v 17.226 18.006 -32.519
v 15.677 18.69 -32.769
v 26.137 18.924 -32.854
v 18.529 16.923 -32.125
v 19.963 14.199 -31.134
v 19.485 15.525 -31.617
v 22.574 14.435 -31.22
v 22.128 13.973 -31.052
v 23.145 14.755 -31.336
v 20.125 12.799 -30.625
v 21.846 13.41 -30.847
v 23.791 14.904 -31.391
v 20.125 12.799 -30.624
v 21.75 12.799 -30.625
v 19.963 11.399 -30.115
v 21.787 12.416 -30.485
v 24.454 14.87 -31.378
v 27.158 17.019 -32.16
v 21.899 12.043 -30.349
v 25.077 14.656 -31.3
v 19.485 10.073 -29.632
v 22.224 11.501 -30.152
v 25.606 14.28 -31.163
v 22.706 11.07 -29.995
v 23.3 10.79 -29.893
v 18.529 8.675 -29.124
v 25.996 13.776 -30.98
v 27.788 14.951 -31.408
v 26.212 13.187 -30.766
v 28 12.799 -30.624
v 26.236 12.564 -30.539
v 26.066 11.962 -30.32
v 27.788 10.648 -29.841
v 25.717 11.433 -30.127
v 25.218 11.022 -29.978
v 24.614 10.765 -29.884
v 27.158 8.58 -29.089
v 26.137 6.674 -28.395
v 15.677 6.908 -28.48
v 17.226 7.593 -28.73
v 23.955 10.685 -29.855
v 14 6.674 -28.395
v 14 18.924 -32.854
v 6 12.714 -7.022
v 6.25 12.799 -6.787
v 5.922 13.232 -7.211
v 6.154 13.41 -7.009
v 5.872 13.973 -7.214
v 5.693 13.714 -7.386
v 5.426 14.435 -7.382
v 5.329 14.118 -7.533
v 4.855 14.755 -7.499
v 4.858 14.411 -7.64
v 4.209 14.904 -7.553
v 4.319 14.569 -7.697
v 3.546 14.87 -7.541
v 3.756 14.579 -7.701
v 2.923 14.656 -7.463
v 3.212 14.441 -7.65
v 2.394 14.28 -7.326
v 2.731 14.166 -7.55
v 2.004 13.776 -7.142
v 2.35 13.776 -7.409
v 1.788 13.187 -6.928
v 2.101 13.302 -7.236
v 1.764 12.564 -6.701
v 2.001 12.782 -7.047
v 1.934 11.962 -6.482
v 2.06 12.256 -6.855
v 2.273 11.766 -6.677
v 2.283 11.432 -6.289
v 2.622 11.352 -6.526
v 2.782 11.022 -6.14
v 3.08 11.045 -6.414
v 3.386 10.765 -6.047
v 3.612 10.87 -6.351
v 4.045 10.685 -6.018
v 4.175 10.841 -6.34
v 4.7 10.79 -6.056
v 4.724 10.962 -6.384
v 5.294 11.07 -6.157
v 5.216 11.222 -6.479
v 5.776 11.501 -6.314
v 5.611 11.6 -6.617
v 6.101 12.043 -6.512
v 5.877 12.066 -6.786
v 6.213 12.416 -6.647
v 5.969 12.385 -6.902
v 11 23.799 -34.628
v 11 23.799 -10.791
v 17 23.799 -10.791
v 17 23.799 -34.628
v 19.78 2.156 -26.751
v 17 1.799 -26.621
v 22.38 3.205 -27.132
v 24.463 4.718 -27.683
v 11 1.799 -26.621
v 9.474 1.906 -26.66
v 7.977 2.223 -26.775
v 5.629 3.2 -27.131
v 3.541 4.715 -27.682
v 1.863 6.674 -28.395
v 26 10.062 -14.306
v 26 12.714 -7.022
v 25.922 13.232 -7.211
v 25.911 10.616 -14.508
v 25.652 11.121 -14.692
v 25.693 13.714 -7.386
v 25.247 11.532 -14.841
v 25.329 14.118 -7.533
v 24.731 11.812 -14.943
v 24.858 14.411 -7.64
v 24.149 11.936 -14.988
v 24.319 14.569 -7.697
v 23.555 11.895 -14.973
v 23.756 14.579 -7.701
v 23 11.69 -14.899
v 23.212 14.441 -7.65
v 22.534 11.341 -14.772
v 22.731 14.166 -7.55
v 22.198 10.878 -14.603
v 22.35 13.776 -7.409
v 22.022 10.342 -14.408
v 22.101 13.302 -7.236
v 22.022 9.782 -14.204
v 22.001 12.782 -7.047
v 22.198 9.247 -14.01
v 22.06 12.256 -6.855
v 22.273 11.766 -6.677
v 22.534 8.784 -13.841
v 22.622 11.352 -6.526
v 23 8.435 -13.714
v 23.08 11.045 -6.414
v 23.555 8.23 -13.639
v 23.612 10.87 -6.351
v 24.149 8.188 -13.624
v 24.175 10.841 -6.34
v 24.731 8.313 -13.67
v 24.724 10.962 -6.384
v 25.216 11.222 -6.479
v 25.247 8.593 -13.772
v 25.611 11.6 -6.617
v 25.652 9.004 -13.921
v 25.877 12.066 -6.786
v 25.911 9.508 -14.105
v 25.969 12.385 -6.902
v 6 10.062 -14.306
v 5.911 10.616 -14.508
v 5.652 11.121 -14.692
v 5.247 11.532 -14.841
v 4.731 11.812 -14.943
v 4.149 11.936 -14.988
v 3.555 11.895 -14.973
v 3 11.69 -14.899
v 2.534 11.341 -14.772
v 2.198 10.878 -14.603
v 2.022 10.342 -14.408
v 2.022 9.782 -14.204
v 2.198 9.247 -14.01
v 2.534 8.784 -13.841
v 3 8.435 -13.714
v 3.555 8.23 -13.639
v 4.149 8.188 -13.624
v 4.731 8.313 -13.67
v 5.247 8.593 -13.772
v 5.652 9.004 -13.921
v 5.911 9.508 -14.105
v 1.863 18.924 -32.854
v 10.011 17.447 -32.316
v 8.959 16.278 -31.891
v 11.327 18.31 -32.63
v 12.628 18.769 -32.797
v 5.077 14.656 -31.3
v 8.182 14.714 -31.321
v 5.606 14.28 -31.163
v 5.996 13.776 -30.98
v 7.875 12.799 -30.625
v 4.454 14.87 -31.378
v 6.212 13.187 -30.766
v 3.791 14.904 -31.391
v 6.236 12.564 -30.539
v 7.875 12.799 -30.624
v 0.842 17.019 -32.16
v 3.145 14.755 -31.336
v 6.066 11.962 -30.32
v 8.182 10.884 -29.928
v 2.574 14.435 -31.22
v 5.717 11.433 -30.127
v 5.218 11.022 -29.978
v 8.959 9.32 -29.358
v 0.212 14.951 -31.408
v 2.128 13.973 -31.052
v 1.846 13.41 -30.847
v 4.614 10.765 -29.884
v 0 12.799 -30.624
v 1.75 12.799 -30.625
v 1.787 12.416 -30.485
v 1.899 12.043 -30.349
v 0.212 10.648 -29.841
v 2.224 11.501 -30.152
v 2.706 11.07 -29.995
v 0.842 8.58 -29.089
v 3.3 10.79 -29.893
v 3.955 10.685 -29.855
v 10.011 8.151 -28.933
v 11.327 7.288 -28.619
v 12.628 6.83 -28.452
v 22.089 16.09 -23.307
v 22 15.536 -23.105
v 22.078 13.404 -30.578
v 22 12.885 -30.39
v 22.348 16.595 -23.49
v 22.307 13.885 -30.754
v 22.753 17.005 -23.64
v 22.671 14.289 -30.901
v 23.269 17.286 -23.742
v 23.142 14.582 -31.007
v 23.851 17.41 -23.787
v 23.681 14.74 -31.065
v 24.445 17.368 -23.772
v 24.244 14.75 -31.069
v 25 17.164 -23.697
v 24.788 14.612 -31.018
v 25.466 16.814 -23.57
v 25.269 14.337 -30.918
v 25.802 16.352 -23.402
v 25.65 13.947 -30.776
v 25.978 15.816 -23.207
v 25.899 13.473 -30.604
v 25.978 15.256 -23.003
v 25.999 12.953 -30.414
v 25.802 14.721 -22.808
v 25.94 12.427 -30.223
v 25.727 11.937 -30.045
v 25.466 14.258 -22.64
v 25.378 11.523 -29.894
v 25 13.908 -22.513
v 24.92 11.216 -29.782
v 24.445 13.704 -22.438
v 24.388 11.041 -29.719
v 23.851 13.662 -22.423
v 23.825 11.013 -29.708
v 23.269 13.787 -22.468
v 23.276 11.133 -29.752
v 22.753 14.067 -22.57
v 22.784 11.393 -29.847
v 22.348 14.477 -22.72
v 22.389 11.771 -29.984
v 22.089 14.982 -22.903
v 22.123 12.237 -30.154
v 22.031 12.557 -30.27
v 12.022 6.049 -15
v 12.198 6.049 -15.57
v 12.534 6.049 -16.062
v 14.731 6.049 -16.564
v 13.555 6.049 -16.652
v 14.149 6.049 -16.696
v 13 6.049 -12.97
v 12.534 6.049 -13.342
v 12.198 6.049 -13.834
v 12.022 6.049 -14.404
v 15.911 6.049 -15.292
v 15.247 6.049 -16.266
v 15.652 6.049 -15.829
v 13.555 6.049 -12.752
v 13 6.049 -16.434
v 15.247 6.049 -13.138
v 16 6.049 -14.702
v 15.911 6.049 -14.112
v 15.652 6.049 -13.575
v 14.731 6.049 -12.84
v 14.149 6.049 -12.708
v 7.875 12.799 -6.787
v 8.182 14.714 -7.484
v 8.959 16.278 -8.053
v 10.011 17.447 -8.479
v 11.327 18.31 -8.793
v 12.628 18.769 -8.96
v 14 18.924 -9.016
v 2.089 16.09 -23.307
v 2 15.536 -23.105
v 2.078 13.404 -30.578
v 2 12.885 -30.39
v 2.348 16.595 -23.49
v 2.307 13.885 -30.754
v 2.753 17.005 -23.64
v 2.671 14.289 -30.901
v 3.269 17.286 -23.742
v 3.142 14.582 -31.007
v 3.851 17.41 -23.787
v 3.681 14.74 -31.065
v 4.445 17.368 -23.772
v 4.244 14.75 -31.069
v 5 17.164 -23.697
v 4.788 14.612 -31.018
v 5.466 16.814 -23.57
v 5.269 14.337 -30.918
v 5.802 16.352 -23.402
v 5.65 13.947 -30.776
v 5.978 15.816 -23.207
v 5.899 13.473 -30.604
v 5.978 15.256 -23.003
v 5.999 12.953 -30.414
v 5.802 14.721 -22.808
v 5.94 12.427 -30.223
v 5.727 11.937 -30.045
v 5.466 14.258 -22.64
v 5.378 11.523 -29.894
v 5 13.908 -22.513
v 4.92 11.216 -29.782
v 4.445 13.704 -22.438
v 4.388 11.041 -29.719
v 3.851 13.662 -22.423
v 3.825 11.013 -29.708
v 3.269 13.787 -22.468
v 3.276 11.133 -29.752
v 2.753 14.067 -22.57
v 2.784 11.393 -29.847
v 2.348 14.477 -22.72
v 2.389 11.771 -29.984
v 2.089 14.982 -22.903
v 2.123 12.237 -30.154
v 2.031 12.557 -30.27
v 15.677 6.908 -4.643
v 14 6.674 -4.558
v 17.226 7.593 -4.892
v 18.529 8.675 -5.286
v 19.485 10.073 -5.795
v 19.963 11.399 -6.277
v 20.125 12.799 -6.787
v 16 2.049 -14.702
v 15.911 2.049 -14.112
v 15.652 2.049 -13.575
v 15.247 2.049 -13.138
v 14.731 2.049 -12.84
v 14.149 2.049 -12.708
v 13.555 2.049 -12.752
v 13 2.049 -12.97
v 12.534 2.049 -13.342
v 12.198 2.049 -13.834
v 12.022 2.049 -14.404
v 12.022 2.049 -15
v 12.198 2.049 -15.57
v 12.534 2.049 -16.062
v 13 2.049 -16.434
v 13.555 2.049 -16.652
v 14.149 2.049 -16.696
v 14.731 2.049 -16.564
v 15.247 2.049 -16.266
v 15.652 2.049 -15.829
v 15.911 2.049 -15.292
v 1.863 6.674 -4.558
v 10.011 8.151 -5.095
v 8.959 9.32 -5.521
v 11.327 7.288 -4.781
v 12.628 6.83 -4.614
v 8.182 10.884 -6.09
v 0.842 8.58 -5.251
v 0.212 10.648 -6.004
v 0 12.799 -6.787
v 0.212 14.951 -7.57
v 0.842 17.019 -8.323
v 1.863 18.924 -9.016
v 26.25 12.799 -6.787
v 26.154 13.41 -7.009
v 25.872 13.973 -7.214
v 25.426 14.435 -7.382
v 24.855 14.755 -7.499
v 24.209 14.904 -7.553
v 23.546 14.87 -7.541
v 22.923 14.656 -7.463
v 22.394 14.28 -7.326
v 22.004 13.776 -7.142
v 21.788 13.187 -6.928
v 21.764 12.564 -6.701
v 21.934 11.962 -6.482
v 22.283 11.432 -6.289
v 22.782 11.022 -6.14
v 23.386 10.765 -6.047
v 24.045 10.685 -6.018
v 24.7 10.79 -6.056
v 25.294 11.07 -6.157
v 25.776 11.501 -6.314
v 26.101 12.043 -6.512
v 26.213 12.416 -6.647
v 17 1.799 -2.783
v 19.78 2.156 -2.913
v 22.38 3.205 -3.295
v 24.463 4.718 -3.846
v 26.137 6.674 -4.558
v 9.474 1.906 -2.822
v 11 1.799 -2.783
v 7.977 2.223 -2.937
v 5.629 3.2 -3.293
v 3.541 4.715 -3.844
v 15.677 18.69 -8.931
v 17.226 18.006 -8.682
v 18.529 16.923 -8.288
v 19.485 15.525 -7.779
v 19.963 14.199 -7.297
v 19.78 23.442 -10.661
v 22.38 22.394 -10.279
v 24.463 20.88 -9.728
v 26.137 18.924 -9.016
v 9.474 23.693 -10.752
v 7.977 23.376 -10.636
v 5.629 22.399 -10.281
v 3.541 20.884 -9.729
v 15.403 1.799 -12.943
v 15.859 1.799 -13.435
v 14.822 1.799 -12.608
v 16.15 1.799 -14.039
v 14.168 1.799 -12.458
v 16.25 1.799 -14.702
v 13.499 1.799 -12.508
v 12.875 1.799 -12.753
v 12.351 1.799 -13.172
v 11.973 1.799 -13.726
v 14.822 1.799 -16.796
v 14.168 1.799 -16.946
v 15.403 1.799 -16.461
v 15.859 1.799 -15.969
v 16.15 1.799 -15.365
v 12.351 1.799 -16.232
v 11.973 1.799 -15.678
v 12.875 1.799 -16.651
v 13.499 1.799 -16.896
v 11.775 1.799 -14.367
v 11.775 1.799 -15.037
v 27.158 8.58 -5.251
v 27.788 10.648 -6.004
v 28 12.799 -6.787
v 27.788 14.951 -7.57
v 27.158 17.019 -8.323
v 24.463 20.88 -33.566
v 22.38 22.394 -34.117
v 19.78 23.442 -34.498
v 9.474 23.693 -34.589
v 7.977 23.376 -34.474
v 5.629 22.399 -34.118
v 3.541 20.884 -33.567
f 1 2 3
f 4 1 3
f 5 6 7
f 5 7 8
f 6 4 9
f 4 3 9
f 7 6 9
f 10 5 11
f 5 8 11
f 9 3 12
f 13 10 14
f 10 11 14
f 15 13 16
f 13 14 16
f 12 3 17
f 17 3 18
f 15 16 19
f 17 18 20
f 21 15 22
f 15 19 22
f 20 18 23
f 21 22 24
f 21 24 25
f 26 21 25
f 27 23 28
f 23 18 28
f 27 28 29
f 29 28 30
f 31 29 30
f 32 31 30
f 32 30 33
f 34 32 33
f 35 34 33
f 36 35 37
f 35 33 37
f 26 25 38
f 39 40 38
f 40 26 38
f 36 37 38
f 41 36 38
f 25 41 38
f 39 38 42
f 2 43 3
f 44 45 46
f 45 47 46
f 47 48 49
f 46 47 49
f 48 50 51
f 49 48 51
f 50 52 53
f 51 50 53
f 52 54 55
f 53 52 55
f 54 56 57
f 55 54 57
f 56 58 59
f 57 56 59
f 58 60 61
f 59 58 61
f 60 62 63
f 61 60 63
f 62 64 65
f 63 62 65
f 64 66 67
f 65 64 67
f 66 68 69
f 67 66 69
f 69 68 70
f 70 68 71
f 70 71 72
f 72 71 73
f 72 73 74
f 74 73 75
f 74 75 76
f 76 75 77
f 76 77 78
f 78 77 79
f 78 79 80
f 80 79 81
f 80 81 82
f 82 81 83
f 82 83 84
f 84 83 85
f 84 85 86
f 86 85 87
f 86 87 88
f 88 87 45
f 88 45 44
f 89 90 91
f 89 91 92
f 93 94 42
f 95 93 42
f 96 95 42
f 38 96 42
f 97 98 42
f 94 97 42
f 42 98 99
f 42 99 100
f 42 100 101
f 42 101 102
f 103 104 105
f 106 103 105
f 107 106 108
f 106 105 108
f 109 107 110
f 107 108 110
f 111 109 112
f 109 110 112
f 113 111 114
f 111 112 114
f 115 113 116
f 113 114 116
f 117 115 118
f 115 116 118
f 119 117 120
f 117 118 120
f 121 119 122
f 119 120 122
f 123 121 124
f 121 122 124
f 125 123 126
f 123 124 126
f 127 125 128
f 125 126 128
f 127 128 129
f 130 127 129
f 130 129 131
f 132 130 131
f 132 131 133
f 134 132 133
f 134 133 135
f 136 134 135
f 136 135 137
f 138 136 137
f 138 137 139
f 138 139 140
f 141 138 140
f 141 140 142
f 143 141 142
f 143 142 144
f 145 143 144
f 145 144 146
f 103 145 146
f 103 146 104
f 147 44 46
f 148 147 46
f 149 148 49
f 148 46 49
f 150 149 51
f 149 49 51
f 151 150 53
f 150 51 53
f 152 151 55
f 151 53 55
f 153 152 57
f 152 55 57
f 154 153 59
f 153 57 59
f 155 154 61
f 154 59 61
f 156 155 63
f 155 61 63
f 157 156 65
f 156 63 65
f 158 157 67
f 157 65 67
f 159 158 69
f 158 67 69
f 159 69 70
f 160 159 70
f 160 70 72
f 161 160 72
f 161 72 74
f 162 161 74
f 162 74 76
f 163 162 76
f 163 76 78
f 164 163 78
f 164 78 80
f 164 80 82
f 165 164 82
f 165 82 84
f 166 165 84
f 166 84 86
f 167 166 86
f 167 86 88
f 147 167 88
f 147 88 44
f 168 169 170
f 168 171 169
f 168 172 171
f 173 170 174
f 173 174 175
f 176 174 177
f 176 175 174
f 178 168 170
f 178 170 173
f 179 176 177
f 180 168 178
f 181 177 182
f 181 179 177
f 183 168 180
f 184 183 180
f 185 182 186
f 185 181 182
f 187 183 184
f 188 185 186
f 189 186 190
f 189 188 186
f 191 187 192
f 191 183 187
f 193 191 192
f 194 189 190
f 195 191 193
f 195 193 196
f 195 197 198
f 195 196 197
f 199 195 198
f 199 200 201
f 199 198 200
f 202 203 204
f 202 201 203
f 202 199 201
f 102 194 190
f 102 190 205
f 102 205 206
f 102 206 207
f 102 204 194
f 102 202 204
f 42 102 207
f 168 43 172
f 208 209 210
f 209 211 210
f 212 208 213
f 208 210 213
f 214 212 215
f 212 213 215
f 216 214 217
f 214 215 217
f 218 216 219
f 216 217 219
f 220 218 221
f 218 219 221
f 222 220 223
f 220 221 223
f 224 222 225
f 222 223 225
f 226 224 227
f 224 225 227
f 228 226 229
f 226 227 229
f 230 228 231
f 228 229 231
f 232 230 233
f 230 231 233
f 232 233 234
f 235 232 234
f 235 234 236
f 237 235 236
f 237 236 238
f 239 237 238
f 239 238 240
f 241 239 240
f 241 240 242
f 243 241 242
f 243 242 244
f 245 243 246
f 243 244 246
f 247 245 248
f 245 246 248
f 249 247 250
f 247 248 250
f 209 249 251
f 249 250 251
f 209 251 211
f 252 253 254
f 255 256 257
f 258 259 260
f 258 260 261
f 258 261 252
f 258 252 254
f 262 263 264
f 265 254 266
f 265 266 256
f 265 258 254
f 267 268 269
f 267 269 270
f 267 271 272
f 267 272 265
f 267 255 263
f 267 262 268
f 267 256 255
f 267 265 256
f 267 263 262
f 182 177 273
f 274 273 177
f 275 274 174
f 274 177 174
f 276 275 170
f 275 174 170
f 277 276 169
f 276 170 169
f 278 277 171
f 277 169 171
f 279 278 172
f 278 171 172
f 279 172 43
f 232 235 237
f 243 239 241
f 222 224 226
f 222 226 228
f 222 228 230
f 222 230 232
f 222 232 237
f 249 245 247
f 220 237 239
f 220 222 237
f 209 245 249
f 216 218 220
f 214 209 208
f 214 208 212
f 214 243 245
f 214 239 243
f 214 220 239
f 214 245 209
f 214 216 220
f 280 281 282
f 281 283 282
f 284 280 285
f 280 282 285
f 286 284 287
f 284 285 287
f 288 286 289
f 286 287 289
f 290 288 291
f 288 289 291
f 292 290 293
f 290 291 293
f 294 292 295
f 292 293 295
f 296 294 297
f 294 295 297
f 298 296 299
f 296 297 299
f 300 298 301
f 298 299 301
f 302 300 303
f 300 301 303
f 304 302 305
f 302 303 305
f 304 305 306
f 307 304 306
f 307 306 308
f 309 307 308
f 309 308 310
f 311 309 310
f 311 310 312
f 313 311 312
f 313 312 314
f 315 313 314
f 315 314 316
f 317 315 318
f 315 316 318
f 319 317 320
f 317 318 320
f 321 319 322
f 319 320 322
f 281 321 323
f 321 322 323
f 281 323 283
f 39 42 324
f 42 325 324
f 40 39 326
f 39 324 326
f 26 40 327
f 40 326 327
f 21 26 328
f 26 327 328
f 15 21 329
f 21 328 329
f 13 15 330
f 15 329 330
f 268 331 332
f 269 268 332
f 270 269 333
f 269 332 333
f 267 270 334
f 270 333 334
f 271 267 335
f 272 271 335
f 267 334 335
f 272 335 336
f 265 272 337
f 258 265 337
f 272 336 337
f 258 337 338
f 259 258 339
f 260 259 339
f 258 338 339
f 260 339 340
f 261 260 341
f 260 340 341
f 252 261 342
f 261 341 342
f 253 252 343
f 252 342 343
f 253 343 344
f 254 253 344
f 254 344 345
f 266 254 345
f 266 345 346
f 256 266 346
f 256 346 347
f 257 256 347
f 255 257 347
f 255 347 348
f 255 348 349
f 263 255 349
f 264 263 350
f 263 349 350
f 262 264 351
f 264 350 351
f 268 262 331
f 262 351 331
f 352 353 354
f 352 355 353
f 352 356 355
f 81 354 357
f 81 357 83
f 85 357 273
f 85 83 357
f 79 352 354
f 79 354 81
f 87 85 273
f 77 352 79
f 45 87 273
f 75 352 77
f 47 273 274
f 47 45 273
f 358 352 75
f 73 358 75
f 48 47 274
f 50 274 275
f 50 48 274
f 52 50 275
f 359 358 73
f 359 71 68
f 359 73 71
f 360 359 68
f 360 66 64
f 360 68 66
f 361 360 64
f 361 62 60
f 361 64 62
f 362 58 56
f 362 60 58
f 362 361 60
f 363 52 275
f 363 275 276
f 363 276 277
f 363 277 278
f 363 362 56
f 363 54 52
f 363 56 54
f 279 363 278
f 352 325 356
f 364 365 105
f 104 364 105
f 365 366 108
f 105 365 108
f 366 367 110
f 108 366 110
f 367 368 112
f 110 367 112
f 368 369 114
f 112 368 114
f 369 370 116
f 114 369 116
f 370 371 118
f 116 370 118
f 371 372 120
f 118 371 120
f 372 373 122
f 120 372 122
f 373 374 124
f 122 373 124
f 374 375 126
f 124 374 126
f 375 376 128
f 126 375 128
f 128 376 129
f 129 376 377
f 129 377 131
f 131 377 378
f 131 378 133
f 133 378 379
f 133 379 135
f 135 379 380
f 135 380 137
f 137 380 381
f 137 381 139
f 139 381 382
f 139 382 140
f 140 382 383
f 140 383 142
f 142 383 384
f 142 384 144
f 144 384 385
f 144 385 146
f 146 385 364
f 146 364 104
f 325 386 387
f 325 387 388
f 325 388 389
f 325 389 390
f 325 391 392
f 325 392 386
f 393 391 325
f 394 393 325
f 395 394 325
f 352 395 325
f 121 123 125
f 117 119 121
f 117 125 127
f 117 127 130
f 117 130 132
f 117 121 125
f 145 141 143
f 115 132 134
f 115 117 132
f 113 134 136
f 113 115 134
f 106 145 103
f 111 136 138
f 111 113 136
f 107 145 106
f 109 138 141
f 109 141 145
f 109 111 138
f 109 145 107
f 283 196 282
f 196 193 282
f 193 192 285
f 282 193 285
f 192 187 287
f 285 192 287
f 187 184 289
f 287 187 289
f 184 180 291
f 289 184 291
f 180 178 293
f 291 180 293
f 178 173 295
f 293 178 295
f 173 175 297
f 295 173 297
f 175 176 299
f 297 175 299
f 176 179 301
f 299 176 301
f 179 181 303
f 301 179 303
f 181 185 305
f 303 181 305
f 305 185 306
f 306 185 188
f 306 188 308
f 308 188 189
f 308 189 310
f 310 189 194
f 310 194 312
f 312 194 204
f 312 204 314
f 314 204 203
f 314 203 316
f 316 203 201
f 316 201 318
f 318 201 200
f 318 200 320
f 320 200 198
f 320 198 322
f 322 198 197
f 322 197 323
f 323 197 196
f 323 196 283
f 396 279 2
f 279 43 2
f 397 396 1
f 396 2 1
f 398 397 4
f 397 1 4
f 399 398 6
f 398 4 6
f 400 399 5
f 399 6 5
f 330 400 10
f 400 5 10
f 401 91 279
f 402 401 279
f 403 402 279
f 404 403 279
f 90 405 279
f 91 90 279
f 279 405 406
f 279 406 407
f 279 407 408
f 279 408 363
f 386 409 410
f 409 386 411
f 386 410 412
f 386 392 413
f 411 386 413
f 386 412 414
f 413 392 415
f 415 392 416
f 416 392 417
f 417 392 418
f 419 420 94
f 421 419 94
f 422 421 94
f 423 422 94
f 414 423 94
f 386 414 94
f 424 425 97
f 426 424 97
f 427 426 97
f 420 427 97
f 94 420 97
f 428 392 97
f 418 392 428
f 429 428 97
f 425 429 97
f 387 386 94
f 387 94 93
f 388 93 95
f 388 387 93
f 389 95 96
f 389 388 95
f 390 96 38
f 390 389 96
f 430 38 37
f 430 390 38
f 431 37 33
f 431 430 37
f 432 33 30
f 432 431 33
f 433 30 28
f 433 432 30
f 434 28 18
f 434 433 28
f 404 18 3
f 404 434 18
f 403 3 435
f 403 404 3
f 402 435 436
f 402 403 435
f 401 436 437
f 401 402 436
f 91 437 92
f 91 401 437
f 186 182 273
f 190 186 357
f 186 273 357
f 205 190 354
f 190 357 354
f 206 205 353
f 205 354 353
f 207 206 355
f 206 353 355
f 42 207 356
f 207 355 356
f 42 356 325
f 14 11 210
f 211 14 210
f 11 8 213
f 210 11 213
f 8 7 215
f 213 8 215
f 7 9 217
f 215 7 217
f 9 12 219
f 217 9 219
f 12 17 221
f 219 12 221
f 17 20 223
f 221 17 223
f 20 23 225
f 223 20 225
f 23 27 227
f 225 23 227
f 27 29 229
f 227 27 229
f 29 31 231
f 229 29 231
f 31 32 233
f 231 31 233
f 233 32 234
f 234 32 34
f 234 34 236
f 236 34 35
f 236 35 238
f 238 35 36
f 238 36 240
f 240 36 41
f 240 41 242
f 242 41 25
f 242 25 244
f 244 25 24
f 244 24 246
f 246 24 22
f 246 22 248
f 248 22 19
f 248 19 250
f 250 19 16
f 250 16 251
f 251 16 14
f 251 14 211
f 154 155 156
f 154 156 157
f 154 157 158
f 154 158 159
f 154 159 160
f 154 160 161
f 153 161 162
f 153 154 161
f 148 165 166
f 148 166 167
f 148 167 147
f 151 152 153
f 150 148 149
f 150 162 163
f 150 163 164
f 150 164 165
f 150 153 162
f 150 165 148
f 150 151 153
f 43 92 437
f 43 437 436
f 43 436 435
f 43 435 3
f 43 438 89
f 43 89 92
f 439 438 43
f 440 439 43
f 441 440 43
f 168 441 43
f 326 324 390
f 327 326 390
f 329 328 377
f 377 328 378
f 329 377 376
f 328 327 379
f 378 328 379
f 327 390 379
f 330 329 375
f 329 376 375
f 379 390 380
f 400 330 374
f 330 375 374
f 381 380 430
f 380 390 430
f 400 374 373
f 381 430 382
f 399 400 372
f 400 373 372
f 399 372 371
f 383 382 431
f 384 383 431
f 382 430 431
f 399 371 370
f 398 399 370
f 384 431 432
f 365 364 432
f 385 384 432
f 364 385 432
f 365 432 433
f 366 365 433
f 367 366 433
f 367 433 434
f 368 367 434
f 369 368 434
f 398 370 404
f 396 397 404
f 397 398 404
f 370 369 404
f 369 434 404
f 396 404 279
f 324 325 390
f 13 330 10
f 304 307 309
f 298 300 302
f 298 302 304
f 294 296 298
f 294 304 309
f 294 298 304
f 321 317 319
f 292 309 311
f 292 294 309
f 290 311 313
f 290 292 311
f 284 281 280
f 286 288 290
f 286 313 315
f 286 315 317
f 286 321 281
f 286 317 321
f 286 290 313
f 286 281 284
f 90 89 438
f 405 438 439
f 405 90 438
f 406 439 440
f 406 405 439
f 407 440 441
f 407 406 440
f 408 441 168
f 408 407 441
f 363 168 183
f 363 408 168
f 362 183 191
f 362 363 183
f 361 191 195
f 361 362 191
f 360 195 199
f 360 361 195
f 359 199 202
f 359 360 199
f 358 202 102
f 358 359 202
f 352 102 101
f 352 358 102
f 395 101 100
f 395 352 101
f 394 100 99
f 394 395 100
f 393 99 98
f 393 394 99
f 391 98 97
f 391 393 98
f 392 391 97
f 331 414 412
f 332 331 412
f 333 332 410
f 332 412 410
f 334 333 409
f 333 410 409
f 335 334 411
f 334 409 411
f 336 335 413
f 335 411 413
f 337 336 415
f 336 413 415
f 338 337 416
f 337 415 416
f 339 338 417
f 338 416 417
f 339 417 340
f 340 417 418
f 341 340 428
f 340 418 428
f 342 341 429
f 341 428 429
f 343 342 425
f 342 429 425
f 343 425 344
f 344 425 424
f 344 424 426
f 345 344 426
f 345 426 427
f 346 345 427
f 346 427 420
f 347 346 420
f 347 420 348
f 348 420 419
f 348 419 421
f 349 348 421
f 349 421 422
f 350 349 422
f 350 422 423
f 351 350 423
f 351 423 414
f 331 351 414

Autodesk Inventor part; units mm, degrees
ref_plane "YZ Plane" through (0, 0, 0) normal (1, 0, 0) x (0, 1, 0)
ref_plane "XZ Plane" through (0, 0, 0) normal (0, 1, 0) x (-1, 0, 0)
ref_plane "XY Plane" through (0, 0, 0) normal (0, 0, 1) x (1, 0, 0)
sketch "Sketch1" plane through (0, 0, 0) normal (1, 0, 0) x (0, 1, 0)
  line L0 (0, 0) -> (35.2385, -12.8258) construction
  line L1 (0, 0) -> (37.5, 0) construction
  line L2 (35.2385, -12.8258) -> (34.5544, -14.7051) construction
  line L3 (34.5544, -14.7051) -> (-0.684, -1.8794) construction
  line L4 (-0.684, -1.8794) -> (0, 0) construction
  line L5 (34.5544, -14.7051) -> (26.8932, -35.7543) construction
  line L6 (26.8932, -35.7543) -> (-8.3453, -22.9285) construction
  line L7 (-8.3453, -22.9285) -> (-9.0293, -24.8079) construction
  line L8 (-9.0293, -24.8079) -> (26.2091, -37.6336) construction
  line L9 (26.2091, -37.6336) -> (26.8932, -35.7543) construction
  line L10 (16.9352, -8.2923) -> (8.6633, -29.1191) construction
  line L11 (12.7992, 23.1416) -> (12.7992, -60.5529) construction
  line L12 (6.7992, 23.1416) -> (6.7992, -60.5529) construction
  line L13 (18.7992, 23.1416) -> (18.7992, -60.5529) construction
  line L14 (12.7992, -4.6585) -> (23.6057, -8.5918) construction
  line L15 (23.6057, -8.5918) -> (14.5764, -33.3997) construction
  line L16 (12.7992, -4.6585) -> (1.9928, -0.7253) construction
  line L17 (1.9928, -0.7253) -> (-7.0366, -25.5332) construction
  line L18 (1.7992, 23.1416) -> (1.7992, -60.5529)
  line L19 (23.7992, 23.1416) -> (23.7992, -60.5529)
  line L20 (18.9242, 23.1416) -> (18.9242, -60.5529)
  line L21 (6.6742, 23.1416) -> (6.6742, -60.5529)
  line L22 (1.7992, -2.7832) -> (6.6742, -4.5576)
  line L23 (1.7992, -26.6208) -> (6.6742, -28.3952)
  line L24 (23.7992, -34.6282) -> (18.9242, -32.8538)
  line L25 (23.7992, -10.7906) -> (18.9242, -9.0162)
  point P0 (12.7992, -18.7057)
  dimension "d1" = 37.5
  dimension "d2" = 20
  dimension "d3" = 2
  dimension "d4" = 22.4
  dimension "d5" = 37.5
  dimension "d6" = 2
  dimension "d7" = 6
  dimension "d8" = 6
  dimension "d9" = 11.5
  dimension "d10" = 11.5
  dimension "d13" = 11
  dimension "d14" = 11
  dimension "d15" = 4.875
  dimension "d16" = 4.875
extrude "Extrusion1" add sketch "Sketch1" along normal blind 28
sketch "Sketch2" plane through (28, 0, 0) normal (1, 0, 0) x (0, 0, -1)
  line L0 (28.3952, 6.6742) -> (4.5576, 6.6742) projected
  line L1 (9.0162, 18.9242) -> (32.8538, 18.9242) projected
  line L2 (4.5576, 6.6742) -> (9.0162, 18.9242)
  line L3 (9.0162, 18.9242) -> (32.8538, 18.9242)
  line L4 (32.8538, 18.9242) -> (28.3952, 6.6742)
  line L5 (28.3952, 6.6742) -> (4.5576, 6.6742)
  point P0 (0, 0)
  point P1 (28.3952, 6.6742)
extrude "Extrusion2" add sketch "Sketch2" against normal blind 7.875
sketch "Sketch3" plane through (0, 0, 0) normal (-1, 0, 0) x (0, 0, 1)
  line L0 (-9.0162, 18.9242) -> (-32.8538, 18.9242) projected
  line L1 (-26.6208, 1.7992) -> (-28.3952, 6.6742) projected
  line L2 (-32.8538, 18.9242) -> (-28.3952, 6.6742)
  line L3 (-28.3952, 6.6742) -> (-4.5576, 6.6742)
  line L4 (-4.5576, 6.6742) -> (-9.0162, 18.9242)
  line L5 (-9.0162, 18.9242) -> (-32.8538, 18.9242)
  point P0 (0, 0)
  point P1 (-9.0162, 18.9242)
extrude "Extrusion3" add sketch "Sketch3" against normal blind 7.875
fillet "Fillet1" radius 6.125 4 edges at (7.875, 6.6742, -16.4764) (20.125, 6.6742, -16.4764) (20.125, 18.9242, -20.935) (7.875, 18.9242, -20.935)
fillet "Fillet2" radius 11 4 edges at (0, 23.7992, -22.7094) (0, 1.7992, -14.702) (28, 1.7992, -14.702) (28, 23.7992, -22.7094)
sketch "Sketch4" plane through (11, 23.7992, -10.7906) normal (0, 0.3420201, 0.9396926) x (1, 0, 0)
  ellipse E0 centre (3, -11.706) end of major axis (3, -18.224) minor radius 6.125 construction
  circle A0 centre (3, -11.706) radius 10 construction
  circle A1 centre (-7, -11.706) radius 2
  circle A2 centre (13, -11.706) radius 2
  point P0 (-11, -26.0546)
  dimension "d25" = 20
  dimension "d26" = 4
  dimension "d27" = 4
extrude "Extrusion4" cut sketch "Sketch4" against normal blind 8
sketch "Sketch5" plane through (17, 1.7992, -26.6208) normal (0, -0.3420201, -0.9396926) x (-1, 0, 0)
  ellipse E0 centre (3, 11.706) end of major axis (3, 18.224) minor radius 6.125 projected
  circle A0 centre (3, 11.706) radius 10 construction
  circle A1 centre (-7, 11.706) radius 2
  circle A2 centre (13, 11.706) radius 2
  point P0 (17, -10.7956)
  dimension "d30" = 20
  dimension "d31" = 4
  dimension "d32" = 4
extrude "Extrusion5" cut sketch "Sketch5" against normal blind 8 contours A1 | A2
sketch "Sketch6" plane through (11, 1.7992, -2.7832) normal (0, -1, 0) x (1, 0, 0)
  line L0 (0, -23.8376) -> (0, 0) projected
  line L1 (0, -11.9188) -> (6, -11.9188) construction
  line L2 (6, 0) -> (6, -23.8376) projected
  circle A0 centre (3, -11.9188) radius 2
  point P0 (-11, 2.7832)
  dimension "d35" = 4
extrude "Extrusion6" cut sketch "Sketch6" against normal blind 4.25
chamfer "Chamfer1" distance 0.25 angle 45 5 edges at (12, 1.7992, -14.702) (6, 12.7992, -30.6245) (26, 12.7992, -30.6245) (22, 12.7992, -6.7869) (2, 12.7992, -6.7869)
properties part number "Leg_Loadpipe_Mount" material "Nylon 6/6"
